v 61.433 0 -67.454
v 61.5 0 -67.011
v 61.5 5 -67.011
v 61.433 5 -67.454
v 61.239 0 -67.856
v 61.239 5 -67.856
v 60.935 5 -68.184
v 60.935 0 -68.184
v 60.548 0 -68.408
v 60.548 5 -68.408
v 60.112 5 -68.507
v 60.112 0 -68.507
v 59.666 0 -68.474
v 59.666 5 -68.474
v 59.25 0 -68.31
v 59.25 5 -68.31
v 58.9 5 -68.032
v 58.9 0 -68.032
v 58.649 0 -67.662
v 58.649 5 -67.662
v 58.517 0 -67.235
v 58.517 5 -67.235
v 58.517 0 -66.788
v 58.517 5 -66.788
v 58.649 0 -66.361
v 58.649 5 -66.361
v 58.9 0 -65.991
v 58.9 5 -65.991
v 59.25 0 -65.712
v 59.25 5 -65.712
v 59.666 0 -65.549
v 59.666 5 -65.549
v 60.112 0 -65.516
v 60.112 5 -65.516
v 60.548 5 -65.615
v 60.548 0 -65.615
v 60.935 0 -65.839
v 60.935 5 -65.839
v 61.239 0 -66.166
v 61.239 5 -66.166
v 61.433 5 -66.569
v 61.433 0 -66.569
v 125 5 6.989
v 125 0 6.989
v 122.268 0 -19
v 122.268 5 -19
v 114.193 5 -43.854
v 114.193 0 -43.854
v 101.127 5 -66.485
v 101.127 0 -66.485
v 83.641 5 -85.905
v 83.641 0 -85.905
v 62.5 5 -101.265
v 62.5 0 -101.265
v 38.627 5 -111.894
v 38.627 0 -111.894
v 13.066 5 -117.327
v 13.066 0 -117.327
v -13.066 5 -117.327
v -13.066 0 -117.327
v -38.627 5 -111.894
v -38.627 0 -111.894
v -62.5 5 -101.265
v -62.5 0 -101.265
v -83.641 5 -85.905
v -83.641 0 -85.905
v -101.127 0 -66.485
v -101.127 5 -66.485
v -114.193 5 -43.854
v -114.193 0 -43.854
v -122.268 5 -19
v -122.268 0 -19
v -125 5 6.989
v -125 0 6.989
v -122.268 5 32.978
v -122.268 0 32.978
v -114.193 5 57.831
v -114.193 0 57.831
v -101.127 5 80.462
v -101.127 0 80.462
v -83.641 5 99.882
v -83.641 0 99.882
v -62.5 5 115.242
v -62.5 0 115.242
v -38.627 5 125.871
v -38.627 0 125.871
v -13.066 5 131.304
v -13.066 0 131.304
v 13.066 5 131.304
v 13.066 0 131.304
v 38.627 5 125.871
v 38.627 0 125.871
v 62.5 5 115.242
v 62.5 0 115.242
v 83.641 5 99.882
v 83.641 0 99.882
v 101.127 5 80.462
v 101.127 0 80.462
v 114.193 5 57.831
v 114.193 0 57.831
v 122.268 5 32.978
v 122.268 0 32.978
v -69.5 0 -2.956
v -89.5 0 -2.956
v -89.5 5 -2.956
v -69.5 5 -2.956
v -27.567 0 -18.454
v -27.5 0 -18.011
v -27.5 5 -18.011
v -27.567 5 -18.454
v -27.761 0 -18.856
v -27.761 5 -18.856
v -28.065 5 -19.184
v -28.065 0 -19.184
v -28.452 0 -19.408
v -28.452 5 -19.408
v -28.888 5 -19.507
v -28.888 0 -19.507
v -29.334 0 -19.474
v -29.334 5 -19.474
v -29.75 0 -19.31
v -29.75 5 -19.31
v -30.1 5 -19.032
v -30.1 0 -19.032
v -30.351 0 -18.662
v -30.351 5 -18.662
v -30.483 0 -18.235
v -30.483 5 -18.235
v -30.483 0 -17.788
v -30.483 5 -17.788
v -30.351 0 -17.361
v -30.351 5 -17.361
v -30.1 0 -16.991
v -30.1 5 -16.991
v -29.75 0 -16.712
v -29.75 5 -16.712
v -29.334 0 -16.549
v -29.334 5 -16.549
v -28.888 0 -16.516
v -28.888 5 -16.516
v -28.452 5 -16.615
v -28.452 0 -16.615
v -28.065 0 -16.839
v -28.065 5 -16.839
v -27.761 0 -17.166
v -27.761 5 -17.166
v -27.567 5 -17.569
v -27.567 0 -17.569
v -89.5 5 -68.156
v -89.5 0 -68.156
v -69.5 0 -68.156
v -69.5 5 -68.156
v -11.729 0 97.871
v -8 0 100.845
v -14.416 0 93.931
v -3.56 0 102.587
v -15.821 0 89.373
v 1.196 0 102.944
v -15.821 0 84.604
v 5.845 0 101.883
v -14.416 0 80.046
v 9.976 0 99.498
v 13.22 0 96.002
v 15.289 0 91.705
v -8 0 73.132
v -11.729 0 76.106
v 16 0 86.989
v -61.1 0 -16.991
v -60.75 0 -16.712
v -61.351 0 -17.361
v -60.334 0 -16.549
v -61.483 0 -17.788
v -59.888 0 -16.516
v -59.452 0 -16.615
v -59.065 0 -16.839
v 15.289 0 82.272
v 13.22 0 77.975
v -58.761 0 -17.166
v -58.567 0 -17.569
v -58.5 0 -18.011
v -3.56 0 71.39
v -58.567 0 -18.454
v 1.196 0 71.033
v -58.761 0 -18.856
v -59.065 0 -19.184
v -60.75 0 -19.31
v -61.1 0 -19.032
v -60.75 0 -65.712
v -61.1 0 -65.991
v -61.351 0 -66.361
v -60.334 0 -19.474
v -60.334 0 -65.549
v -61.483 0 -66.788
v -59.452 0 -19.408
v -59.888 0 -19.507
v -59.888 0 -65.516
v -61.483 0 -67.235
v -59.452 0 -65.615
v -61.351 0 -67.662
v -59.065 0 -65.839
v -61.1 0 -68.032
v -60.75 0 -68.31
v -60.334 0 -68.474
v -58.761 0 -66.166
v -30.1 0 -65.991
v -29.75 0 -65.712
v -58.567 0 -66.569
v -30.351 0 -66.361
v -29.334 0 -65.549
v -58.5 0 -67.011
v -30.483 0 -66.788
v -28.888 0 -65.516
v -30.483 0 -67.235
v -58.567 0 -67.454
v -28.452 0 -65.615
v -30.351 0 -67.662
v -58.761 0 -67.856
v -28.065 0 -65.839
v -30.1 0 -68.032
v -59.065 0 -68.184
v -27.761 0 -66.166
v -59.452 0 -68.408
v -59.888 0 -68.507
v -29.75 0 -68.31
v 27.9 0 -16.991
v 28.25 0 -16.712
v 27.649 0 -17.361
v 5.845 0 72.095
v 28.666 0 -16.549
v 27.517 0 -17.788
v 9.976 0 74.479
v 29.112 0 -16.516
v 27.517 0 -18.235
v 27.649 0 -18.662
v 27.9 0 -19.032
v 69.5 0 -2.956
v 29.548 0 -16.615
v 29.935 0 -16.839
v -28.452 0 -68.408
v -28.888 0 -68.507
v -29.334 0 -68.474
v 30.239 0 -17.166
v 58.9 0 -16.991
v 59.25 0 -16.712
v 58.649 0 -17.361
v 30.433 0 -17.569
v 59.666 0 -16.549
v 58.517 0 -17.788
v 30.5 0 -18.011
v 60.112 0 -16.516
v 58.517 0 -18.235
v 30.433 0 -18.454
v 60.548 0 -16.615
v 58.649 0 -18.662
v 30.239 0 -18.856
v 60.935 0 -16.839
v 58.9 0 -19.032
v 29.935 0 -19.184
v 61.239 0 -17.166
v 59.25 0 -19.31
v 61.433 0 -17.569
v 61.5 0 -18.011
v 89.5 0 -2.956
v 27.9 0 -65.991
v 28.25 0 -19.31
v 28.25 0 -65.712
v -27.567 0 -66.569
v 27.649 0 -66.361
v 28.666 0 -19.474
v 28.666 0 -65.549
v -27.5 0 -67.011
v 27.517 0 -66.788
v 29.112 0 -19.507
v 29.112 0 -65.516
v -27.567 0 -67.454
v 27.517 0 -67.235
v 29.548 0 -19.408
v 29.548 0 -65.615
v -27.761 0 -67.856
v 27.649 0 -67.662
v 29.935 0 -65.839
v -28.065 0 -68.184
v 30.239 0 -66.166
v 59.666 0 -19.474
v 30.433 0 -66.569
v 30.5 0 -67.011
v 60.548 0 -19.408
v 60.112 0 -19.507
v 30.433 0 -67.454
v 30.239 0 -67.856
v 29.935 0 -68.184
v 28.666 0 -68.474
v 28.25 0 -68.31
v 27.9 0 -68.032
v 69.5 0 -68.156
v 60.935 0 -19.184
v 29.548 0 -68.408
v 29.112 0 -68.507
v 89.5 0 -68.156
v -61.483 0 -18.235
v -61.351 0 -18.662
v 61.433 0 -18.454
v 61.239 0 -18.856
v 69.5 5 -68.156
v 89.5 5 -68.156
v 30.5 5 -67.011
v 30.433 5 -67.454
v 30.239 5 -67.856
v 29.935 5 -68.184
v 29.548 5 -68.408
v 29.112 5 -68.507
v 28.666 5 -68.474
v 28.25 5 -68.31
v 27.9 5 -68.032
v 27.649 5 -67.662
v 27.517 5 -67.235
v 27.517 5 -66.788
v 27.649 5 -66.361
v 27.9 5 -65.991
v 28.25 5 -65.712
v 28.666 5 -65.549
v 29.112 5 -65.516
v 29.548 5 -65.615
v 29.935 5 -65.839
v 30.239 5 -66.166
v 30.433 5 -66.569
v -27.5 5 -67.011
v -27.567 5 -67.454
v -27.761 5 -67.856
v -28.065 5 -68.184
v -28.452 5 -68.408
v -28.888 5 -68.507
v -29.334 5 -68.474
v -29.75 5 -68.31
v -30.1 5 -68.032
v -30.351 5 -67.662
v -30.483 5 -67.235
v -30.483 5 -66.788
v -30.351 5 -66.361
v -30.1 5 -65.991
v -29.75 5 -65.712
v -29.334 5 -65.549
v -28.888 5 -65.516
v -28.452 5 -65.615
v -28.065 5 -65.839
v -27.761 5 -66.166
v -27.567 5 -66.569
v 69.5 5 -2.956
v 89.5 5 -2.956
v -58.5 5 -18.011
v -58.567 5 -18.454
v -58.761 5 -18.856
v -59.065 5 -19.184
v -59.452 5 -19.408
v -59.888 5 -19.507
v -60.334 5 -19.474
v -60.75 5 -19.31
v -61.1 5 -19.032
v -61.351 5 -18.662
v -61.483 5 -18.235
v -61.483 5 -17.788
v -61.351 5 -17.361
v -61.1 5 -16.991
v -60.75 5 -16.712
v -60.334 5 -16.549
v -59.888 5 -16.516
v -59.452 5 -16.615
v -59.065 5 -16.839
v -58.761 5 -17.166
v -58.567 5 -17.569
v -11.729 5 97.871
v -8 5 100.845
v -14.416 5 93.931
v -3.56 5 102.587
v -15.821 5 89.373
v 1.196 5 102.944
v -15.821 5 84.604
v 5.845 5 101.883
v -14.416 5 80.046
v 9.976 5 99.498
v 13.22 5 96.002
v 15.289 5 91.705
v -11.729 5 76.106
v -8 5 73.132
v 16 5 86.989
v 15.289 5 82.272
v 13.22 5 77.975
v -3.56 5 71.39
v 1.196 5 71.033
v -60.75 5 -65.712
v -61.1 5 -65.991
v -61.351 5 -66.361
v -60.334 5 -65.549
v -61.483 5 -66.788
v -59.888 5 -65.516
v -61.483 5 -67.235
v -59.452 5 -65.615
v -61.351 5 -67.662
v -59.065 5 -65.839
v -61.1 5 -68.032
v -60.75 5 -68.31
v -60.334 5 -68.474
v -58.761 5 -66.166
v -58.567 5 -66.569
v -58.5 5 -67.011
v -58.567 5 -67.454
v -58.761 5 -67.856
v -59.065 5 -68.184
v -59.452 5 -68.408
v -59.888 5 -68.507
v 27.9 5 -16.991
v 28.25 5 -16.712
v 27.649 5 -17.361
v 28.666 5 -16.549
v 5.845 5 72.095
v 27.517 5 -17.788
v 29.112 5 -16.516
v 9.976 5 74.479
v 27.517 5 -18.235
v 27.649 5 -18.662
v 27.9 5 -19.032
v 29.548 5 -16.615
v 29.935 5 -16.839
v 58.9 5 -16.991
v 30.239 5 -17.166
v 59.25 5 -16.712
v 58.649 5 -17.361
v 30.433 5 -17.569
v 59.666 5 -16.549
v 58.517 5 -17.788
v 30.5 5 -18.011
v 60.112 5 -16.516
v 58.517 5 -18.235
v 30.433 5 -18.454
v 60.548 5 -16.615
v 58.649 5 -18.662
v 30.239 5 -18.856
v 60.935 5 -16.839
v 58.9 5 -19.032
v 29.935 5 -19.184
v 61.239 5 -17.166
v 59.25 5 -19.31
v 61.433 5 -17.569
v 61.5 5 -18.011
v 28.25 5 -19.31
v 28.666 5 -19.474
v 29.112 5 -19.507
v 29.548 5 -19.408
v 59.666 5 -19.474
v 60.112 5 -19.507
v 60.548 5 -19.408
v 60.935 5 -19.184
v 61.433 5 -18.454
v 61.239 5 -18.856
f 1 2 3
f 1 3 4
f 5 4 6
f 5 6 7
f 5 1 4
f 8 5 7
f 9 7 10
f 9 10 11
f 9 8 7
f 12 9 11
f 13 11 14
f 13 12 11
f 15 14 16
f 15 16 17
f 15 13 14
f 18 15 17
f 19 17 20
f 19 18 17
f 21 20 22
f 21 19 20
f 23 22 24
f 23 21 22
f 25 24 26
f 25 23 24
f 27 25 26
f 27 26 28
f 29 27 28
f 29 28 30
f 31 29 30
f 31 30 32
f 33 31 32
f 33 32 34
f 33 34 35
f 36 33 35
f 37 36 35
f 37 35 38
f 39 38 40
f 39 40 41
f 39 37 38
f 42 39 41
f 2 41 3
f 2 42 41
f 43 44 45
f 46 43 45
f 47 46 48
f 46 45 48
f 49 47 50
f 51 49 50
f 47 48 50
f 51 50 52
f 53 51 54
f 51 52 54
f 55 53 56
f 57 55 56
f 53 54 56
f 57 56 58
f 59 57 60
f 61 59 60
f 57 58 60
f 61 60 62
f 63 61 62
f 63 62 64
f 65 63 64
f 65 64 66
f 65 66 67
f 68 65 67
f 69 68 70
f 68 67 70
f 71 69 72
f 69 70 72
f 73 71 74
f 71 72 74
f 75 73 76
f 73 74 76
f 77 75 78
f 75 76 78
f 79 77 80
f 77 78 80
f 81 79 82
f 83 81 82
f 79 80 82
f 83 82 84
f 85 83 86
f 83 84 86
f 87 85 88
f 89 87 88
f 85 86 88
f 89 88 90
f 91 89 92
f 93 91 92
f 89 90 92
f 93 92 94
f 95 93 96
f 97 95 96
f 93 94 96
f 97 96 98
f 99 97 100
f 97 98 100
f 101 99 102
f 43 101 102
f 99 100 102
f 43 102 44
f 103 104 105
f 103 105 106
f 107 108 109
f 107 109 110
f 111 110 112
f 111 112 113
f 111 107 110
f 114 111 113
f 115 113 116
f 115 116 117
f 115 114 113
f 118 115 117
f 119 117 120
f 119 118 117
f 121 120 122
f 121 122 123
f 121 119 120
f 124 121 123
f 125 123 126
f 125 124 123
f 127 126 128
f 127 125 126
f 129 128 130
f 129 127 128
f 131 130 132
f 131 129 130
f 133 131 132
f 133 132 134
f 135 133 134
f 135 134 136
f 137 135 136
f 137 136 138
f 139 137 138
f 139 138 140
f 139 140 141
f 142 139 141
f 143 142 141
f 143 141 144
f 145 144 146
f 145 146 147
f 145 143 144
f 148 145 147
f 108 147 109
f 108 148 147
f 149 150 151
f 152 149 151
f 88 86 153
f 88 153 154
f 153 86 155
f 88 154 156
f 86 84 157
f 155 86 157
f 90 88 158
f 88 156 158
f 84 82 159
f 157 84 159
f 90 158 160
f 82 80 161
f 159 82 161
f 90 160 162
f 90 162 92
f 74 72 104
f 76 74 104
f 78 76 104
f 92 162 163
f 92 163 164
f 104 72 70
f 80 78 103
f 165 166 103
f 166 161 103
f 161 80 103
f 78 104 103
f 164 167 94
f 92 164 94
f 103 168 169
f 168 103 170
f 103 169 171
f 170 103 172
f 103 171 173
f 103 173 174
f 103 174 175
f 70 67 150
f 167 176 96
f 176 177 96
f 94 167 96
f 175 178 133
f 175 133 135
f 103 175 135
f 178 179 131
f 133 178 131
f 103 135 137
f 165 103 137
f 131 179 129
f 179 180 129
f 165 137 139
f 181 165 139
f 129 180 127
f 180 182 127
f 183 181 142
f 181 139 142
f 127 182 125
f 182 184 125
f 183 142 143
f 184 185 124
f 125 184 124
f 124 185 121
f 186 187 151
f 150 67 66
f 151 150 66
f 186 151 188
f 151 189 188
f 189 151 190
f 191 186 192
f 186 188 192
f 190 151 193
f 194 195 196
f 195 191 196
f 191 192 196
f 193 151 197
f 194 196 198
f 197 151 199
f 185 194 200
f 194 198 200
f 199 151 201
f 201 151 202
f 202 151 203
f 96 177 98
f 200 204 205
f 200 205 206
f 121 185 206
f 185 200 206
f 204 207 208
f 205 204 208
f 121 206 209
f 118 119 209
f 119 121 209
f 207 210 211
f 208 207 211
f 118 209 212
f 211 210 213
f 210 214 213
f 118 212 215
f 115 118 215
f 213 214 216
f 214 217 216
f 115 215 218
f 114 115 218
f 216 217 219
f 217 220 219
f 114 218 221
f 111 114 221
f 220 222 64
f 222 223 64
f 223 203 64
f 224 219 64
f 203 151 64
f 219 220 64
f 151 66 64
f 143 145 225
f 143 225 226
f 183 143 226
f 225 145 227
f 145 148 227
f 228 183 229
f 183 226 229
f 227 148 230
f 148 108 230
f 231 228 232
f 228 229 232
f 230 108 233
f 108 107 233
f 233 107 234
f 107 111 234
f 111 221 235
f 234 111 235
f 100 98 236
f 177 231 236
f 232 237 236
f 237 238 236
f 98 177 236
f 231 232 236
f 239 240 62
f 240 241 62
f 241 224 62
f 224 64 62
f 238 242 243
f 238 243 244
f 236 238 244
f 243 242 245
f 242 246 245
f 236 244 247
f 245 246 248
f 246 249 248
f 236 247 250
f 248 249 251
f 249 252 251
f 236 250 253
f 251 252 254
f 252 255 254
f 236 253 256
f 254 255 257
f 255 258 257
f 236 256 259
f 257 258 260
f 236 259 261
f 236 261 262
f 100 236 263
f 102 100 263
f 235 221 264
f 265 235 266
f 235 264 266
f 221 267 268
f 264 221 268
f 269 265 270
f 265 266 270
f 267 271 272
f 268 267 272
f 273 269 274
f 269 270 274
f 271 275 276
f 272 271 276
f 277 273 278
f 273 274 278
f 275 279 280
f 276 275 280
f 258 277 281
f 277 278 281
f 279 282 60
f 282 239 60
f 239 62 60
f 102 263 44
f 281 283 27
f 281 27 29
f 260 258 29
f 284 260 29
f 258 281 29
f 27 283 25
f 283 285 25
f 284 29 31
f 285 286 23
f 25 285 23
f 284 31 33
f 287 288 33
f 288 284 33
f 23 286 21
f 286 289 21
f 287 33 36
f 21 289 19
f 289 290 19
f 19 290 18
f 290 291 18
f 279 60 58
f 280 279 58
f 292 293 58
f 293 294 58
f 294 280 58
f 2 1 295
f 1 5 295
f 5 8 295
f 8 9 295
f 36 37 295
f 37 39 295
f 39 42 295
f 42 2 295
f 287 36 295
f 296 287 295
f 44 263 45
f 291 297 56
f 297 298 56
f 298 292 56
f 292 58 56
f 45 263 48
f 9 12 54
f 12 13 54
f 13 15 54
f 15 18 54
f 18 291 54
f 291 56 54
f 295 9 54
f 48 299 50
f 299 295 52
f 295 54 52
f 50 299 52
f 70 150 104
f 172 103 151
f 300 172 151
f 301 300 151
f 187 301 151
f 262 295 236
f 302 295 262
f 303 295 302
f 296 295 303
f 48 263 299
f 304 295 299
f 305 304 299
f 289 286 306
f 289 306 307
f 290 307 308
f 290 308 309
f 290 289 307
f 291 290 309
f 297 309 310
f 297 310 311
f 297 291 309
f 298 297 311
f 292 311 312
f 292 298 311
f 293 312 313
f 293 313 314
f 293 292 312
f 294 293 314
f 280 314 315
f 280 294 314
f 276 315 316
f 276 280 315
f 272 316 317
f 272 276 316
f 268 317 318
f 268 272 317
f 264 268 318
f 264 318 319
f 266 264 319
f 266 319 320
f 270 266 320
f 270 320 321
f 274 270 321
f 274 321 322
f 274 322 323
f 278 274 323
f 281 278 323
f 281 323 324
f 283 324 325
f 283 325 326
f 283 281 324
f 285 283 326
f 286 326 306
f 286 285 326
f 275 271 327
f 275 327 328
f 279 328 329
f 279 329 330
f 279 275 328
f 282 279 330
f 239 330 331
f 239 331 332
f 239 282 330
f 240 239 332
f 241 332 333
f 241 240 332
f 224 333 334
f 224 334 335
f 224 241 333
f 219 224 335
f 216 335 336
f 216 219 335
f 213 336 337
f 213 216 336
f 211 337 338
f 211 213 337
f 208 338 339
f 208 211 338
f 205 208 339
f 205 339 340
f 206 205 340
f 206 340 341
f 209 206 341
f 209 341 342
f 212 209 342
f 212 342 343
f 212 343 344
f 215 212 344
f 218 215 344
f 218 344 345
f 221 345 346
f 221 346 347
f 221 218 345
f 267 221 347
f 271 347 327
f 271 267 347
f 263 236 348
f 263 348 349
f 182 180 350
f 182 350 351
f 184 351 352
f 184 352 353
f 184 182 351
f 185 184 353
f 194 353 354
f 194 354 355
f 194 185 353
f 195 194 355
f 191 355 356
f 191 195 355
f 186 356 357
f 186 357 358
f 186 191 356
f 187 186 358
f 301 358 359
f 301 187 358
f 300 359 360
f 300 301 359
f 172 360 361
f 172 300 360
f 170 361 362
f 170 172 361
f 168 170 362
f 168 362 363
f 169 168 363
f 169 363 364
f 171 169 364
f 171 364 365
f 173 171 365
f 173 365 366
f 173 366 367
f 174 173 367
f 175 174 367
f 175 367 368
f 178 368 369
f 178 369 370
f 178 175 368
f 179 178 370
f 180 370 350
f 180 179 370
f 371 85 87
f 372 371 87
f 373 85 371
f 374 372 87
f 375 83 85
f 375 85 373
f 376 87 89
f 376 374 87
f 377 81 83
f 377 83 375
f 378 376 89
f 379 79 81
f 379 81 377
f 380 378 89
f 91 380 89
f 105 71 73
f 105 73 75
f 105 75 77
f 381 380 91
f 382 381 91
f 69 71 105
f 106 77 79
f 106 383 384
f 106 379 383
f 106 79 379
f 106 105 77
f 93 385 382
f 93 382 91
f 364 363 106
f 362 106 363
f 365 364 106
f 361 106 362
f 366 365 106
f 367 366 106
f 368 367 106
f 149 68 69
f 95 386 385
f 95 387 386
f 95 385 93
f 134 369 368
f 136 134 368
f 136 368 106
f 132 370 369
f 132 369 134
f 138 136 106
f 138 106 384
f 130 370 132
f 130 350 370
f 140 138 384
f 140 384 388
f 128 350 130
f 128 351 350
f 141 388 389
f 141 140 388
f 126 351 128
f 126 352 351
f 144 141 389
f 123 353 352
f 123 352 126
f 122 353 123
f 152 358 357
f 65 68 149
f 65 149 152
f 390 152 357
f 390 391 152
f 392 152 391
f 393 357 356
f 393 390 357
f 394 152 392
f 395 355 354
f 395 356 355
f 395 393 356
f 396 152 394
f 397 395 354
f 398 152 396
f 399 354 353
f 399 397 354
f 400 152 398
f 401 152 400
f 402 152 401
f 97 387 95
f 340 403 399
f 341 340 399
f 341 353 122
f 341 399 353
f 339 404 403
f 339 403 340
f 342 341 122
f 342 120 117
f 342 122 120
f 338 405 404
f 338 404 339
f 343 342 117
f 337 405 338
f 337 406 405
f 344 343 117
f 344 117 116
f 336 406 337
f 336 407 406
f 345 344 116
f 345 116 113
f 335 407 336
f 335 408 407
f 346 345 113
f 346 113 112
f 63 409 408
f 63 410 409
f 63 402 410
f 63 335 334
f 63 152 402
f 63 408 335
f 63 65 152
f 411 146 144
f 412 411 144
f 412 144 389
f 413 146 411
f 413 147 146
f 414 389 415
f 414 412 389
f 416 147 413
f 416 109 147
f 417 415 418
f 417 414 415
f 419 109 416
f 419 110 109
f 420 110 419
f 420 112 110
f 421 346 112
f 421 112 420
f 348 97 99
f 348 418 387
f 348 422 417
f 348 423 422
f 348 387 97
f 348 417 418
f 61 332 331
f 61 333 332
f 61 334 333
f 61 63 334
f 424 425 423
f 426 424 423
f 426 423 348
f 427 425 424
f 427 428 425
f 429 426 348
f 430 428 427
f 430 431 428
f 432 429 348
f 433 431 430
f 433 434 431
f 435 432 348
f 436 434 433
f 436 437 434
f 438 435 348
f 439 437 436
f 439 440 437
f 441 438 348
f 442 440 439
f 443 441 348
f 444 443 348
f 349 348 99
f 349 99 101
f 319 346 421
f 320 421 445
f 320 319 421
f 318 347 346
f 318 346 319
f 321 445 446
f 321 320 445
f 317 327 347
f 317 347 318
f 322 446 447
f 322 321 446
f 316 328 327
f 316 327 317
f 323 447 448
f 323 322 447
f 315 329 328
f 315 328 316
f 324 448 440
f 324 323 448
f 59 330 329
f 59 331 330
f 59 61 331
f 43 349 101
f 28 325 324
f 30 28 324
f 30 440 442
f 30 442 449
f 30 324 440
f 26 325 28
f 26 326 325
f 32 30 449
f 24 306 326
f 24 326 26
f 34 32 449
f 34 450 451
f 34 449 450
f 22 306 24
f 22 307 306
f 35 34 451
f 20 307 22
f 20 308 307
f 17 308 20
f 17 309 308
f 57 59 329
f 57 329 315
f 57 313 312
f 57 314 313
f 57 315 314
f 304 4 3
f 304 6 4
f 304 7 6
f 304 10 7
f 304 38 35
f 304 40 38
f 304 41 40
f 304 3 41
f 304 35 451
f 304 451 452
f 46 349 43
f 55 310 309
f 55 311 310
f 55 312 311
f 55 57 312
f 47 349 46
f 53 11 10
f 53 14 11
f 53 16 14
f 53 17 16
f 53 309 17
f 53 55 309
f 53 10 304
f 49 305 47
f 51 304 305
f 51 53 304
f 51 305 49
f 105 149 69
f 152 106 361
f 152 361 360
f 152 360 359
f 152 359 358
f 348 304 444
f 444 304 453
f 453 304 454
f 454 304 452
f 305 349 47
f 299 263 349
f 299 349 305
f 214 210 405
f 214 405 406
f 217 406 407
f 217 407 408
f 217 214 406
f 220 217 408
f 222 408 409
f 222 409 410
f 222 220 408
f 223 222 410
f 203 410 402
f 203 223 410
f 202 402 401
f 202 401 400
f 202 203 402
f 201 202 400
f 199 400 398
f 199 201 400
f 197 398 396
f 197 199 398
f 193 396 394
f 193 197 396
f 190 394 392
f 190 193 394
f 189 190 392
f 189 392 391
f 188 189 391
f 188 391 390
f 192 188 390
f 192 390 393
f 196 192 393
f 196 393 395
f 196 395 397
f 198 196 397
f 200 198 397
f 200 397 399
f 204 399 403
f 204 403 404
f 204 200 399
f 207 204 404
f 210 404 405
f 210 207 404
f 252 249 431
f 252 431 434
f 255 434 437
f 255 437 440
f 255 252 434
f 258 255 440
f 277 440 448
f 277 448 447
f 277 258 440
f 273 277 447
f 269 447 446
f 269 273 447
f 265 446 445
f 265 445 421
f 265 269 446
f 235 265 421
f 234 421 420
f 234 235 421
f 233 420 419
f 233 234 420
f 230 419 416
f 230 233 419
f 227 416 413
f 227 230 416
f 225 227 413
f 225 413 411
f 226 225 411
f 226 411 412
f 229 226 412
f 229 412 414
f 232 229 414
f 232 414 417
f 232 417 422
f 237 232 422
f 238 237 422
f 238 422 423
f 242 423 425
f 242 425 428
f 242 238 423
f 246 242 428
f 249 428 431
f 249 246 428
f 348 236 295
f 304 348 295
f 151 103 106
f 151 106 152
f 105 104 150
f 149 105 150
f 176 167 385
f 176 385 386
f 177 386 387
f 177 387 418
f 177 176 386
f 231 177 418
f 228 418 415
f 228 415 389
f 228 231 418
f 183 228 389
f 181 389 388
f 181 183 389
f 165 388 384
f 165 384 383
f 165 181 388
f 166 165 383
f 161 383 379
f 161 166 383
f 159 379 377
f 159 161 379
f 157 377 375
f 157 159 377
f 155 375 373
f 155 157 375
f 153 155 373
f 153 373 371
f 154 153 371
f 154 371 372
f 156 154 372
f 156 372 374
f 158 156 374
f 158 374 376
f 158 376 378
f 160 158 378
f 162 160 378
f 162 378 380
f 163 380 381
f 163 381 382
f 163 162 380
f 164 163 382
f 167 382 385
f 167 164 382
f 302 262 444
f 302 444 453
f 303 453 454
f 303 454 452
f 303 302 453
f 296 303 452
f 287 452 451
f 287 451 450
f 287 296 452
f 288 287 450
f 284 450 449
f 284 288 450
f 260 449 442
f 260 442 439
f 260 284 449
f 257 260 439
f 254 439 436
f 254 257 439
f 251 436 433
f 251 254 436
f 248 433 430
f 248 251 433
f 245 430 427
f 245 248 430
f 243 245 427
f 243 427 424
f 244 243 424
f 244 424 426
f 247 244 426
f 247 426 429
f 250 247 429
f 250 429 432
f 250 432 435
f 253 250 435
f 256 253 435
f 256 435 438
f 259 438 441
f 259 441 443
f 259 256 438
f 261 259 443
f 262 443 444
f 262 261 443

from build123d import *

# Parameters (mm, degrees)
SKETCH1_R           = 125
SKETCH1_R_2         = 16
SKETCH1_R_3         = 1.5
SKETCH1_W           = 20
SKETCH1_H           = 65.2
BOSS_EXTRUDE1_DEPTH = 5


with BuildPart() as part:
    # Sketch1 → Boss-Extrude1 (new body)
    with BuildSketch(Plane(origin=(0, 0, 0), x_dir=(1, 0, 0), z_dir=(0, 1, 0))):
        with Locations((0, -6.988561475)):
            Circle(SKETCH1_R)
        with Locations((0, -86.988561475)):
            Circle(SKETCH1_R_2, mode=Mode.SUBTRACT)
        with Locations((60, 18.011438525)):
            Circle(SKETCH1_R_3, mode=Mode.SUBTRACT)
        with Locations((60, 67.011438525)):
            Circle(SKETCH1_R_3, mode=Mode.SUBTRACT)
        with Locations((29, 67.011438525)):
            Circle(SKETCH1_R_3, mode=Mode.SUBTRACT)
        with Locations((29, 18.011438525)):
            Circle(SKETCH1_R_3, mode=Mode.SUBTRACT)
        with Locations((-60, 18.011438525)):
            Circle(SKETCH1_R_3, mode=Mode.SUBTRACT)
        with Locations((-29, 18.011438525)):
            Circle(SKETCH1_R_3, mode=Mode.SUBTRACT)
        with Locations((-29, 67.011438525)):
            Circle(SKETCH1_R_3, mode=Mode.SUBTRACT)
        with Locations((-60, 67.011438525)):
            Circle(SKETCH1_R_3, mode=Mode.SUBTRACT)
        with Locations((79.5, 35.555700821)):
            Rectangle(SKETCH1_W, SKETCH1_H, mode=Mode.SUBTRACT)
        with Locations((-79.5, 35.555700821)):
            Rectangle(SKETCH1_W, SKETCH1_H, mode=Mode.SUBTRACT)
    extrude(amount=BOSS_EXTRUDE1_DEPTH)


solid = part.part
